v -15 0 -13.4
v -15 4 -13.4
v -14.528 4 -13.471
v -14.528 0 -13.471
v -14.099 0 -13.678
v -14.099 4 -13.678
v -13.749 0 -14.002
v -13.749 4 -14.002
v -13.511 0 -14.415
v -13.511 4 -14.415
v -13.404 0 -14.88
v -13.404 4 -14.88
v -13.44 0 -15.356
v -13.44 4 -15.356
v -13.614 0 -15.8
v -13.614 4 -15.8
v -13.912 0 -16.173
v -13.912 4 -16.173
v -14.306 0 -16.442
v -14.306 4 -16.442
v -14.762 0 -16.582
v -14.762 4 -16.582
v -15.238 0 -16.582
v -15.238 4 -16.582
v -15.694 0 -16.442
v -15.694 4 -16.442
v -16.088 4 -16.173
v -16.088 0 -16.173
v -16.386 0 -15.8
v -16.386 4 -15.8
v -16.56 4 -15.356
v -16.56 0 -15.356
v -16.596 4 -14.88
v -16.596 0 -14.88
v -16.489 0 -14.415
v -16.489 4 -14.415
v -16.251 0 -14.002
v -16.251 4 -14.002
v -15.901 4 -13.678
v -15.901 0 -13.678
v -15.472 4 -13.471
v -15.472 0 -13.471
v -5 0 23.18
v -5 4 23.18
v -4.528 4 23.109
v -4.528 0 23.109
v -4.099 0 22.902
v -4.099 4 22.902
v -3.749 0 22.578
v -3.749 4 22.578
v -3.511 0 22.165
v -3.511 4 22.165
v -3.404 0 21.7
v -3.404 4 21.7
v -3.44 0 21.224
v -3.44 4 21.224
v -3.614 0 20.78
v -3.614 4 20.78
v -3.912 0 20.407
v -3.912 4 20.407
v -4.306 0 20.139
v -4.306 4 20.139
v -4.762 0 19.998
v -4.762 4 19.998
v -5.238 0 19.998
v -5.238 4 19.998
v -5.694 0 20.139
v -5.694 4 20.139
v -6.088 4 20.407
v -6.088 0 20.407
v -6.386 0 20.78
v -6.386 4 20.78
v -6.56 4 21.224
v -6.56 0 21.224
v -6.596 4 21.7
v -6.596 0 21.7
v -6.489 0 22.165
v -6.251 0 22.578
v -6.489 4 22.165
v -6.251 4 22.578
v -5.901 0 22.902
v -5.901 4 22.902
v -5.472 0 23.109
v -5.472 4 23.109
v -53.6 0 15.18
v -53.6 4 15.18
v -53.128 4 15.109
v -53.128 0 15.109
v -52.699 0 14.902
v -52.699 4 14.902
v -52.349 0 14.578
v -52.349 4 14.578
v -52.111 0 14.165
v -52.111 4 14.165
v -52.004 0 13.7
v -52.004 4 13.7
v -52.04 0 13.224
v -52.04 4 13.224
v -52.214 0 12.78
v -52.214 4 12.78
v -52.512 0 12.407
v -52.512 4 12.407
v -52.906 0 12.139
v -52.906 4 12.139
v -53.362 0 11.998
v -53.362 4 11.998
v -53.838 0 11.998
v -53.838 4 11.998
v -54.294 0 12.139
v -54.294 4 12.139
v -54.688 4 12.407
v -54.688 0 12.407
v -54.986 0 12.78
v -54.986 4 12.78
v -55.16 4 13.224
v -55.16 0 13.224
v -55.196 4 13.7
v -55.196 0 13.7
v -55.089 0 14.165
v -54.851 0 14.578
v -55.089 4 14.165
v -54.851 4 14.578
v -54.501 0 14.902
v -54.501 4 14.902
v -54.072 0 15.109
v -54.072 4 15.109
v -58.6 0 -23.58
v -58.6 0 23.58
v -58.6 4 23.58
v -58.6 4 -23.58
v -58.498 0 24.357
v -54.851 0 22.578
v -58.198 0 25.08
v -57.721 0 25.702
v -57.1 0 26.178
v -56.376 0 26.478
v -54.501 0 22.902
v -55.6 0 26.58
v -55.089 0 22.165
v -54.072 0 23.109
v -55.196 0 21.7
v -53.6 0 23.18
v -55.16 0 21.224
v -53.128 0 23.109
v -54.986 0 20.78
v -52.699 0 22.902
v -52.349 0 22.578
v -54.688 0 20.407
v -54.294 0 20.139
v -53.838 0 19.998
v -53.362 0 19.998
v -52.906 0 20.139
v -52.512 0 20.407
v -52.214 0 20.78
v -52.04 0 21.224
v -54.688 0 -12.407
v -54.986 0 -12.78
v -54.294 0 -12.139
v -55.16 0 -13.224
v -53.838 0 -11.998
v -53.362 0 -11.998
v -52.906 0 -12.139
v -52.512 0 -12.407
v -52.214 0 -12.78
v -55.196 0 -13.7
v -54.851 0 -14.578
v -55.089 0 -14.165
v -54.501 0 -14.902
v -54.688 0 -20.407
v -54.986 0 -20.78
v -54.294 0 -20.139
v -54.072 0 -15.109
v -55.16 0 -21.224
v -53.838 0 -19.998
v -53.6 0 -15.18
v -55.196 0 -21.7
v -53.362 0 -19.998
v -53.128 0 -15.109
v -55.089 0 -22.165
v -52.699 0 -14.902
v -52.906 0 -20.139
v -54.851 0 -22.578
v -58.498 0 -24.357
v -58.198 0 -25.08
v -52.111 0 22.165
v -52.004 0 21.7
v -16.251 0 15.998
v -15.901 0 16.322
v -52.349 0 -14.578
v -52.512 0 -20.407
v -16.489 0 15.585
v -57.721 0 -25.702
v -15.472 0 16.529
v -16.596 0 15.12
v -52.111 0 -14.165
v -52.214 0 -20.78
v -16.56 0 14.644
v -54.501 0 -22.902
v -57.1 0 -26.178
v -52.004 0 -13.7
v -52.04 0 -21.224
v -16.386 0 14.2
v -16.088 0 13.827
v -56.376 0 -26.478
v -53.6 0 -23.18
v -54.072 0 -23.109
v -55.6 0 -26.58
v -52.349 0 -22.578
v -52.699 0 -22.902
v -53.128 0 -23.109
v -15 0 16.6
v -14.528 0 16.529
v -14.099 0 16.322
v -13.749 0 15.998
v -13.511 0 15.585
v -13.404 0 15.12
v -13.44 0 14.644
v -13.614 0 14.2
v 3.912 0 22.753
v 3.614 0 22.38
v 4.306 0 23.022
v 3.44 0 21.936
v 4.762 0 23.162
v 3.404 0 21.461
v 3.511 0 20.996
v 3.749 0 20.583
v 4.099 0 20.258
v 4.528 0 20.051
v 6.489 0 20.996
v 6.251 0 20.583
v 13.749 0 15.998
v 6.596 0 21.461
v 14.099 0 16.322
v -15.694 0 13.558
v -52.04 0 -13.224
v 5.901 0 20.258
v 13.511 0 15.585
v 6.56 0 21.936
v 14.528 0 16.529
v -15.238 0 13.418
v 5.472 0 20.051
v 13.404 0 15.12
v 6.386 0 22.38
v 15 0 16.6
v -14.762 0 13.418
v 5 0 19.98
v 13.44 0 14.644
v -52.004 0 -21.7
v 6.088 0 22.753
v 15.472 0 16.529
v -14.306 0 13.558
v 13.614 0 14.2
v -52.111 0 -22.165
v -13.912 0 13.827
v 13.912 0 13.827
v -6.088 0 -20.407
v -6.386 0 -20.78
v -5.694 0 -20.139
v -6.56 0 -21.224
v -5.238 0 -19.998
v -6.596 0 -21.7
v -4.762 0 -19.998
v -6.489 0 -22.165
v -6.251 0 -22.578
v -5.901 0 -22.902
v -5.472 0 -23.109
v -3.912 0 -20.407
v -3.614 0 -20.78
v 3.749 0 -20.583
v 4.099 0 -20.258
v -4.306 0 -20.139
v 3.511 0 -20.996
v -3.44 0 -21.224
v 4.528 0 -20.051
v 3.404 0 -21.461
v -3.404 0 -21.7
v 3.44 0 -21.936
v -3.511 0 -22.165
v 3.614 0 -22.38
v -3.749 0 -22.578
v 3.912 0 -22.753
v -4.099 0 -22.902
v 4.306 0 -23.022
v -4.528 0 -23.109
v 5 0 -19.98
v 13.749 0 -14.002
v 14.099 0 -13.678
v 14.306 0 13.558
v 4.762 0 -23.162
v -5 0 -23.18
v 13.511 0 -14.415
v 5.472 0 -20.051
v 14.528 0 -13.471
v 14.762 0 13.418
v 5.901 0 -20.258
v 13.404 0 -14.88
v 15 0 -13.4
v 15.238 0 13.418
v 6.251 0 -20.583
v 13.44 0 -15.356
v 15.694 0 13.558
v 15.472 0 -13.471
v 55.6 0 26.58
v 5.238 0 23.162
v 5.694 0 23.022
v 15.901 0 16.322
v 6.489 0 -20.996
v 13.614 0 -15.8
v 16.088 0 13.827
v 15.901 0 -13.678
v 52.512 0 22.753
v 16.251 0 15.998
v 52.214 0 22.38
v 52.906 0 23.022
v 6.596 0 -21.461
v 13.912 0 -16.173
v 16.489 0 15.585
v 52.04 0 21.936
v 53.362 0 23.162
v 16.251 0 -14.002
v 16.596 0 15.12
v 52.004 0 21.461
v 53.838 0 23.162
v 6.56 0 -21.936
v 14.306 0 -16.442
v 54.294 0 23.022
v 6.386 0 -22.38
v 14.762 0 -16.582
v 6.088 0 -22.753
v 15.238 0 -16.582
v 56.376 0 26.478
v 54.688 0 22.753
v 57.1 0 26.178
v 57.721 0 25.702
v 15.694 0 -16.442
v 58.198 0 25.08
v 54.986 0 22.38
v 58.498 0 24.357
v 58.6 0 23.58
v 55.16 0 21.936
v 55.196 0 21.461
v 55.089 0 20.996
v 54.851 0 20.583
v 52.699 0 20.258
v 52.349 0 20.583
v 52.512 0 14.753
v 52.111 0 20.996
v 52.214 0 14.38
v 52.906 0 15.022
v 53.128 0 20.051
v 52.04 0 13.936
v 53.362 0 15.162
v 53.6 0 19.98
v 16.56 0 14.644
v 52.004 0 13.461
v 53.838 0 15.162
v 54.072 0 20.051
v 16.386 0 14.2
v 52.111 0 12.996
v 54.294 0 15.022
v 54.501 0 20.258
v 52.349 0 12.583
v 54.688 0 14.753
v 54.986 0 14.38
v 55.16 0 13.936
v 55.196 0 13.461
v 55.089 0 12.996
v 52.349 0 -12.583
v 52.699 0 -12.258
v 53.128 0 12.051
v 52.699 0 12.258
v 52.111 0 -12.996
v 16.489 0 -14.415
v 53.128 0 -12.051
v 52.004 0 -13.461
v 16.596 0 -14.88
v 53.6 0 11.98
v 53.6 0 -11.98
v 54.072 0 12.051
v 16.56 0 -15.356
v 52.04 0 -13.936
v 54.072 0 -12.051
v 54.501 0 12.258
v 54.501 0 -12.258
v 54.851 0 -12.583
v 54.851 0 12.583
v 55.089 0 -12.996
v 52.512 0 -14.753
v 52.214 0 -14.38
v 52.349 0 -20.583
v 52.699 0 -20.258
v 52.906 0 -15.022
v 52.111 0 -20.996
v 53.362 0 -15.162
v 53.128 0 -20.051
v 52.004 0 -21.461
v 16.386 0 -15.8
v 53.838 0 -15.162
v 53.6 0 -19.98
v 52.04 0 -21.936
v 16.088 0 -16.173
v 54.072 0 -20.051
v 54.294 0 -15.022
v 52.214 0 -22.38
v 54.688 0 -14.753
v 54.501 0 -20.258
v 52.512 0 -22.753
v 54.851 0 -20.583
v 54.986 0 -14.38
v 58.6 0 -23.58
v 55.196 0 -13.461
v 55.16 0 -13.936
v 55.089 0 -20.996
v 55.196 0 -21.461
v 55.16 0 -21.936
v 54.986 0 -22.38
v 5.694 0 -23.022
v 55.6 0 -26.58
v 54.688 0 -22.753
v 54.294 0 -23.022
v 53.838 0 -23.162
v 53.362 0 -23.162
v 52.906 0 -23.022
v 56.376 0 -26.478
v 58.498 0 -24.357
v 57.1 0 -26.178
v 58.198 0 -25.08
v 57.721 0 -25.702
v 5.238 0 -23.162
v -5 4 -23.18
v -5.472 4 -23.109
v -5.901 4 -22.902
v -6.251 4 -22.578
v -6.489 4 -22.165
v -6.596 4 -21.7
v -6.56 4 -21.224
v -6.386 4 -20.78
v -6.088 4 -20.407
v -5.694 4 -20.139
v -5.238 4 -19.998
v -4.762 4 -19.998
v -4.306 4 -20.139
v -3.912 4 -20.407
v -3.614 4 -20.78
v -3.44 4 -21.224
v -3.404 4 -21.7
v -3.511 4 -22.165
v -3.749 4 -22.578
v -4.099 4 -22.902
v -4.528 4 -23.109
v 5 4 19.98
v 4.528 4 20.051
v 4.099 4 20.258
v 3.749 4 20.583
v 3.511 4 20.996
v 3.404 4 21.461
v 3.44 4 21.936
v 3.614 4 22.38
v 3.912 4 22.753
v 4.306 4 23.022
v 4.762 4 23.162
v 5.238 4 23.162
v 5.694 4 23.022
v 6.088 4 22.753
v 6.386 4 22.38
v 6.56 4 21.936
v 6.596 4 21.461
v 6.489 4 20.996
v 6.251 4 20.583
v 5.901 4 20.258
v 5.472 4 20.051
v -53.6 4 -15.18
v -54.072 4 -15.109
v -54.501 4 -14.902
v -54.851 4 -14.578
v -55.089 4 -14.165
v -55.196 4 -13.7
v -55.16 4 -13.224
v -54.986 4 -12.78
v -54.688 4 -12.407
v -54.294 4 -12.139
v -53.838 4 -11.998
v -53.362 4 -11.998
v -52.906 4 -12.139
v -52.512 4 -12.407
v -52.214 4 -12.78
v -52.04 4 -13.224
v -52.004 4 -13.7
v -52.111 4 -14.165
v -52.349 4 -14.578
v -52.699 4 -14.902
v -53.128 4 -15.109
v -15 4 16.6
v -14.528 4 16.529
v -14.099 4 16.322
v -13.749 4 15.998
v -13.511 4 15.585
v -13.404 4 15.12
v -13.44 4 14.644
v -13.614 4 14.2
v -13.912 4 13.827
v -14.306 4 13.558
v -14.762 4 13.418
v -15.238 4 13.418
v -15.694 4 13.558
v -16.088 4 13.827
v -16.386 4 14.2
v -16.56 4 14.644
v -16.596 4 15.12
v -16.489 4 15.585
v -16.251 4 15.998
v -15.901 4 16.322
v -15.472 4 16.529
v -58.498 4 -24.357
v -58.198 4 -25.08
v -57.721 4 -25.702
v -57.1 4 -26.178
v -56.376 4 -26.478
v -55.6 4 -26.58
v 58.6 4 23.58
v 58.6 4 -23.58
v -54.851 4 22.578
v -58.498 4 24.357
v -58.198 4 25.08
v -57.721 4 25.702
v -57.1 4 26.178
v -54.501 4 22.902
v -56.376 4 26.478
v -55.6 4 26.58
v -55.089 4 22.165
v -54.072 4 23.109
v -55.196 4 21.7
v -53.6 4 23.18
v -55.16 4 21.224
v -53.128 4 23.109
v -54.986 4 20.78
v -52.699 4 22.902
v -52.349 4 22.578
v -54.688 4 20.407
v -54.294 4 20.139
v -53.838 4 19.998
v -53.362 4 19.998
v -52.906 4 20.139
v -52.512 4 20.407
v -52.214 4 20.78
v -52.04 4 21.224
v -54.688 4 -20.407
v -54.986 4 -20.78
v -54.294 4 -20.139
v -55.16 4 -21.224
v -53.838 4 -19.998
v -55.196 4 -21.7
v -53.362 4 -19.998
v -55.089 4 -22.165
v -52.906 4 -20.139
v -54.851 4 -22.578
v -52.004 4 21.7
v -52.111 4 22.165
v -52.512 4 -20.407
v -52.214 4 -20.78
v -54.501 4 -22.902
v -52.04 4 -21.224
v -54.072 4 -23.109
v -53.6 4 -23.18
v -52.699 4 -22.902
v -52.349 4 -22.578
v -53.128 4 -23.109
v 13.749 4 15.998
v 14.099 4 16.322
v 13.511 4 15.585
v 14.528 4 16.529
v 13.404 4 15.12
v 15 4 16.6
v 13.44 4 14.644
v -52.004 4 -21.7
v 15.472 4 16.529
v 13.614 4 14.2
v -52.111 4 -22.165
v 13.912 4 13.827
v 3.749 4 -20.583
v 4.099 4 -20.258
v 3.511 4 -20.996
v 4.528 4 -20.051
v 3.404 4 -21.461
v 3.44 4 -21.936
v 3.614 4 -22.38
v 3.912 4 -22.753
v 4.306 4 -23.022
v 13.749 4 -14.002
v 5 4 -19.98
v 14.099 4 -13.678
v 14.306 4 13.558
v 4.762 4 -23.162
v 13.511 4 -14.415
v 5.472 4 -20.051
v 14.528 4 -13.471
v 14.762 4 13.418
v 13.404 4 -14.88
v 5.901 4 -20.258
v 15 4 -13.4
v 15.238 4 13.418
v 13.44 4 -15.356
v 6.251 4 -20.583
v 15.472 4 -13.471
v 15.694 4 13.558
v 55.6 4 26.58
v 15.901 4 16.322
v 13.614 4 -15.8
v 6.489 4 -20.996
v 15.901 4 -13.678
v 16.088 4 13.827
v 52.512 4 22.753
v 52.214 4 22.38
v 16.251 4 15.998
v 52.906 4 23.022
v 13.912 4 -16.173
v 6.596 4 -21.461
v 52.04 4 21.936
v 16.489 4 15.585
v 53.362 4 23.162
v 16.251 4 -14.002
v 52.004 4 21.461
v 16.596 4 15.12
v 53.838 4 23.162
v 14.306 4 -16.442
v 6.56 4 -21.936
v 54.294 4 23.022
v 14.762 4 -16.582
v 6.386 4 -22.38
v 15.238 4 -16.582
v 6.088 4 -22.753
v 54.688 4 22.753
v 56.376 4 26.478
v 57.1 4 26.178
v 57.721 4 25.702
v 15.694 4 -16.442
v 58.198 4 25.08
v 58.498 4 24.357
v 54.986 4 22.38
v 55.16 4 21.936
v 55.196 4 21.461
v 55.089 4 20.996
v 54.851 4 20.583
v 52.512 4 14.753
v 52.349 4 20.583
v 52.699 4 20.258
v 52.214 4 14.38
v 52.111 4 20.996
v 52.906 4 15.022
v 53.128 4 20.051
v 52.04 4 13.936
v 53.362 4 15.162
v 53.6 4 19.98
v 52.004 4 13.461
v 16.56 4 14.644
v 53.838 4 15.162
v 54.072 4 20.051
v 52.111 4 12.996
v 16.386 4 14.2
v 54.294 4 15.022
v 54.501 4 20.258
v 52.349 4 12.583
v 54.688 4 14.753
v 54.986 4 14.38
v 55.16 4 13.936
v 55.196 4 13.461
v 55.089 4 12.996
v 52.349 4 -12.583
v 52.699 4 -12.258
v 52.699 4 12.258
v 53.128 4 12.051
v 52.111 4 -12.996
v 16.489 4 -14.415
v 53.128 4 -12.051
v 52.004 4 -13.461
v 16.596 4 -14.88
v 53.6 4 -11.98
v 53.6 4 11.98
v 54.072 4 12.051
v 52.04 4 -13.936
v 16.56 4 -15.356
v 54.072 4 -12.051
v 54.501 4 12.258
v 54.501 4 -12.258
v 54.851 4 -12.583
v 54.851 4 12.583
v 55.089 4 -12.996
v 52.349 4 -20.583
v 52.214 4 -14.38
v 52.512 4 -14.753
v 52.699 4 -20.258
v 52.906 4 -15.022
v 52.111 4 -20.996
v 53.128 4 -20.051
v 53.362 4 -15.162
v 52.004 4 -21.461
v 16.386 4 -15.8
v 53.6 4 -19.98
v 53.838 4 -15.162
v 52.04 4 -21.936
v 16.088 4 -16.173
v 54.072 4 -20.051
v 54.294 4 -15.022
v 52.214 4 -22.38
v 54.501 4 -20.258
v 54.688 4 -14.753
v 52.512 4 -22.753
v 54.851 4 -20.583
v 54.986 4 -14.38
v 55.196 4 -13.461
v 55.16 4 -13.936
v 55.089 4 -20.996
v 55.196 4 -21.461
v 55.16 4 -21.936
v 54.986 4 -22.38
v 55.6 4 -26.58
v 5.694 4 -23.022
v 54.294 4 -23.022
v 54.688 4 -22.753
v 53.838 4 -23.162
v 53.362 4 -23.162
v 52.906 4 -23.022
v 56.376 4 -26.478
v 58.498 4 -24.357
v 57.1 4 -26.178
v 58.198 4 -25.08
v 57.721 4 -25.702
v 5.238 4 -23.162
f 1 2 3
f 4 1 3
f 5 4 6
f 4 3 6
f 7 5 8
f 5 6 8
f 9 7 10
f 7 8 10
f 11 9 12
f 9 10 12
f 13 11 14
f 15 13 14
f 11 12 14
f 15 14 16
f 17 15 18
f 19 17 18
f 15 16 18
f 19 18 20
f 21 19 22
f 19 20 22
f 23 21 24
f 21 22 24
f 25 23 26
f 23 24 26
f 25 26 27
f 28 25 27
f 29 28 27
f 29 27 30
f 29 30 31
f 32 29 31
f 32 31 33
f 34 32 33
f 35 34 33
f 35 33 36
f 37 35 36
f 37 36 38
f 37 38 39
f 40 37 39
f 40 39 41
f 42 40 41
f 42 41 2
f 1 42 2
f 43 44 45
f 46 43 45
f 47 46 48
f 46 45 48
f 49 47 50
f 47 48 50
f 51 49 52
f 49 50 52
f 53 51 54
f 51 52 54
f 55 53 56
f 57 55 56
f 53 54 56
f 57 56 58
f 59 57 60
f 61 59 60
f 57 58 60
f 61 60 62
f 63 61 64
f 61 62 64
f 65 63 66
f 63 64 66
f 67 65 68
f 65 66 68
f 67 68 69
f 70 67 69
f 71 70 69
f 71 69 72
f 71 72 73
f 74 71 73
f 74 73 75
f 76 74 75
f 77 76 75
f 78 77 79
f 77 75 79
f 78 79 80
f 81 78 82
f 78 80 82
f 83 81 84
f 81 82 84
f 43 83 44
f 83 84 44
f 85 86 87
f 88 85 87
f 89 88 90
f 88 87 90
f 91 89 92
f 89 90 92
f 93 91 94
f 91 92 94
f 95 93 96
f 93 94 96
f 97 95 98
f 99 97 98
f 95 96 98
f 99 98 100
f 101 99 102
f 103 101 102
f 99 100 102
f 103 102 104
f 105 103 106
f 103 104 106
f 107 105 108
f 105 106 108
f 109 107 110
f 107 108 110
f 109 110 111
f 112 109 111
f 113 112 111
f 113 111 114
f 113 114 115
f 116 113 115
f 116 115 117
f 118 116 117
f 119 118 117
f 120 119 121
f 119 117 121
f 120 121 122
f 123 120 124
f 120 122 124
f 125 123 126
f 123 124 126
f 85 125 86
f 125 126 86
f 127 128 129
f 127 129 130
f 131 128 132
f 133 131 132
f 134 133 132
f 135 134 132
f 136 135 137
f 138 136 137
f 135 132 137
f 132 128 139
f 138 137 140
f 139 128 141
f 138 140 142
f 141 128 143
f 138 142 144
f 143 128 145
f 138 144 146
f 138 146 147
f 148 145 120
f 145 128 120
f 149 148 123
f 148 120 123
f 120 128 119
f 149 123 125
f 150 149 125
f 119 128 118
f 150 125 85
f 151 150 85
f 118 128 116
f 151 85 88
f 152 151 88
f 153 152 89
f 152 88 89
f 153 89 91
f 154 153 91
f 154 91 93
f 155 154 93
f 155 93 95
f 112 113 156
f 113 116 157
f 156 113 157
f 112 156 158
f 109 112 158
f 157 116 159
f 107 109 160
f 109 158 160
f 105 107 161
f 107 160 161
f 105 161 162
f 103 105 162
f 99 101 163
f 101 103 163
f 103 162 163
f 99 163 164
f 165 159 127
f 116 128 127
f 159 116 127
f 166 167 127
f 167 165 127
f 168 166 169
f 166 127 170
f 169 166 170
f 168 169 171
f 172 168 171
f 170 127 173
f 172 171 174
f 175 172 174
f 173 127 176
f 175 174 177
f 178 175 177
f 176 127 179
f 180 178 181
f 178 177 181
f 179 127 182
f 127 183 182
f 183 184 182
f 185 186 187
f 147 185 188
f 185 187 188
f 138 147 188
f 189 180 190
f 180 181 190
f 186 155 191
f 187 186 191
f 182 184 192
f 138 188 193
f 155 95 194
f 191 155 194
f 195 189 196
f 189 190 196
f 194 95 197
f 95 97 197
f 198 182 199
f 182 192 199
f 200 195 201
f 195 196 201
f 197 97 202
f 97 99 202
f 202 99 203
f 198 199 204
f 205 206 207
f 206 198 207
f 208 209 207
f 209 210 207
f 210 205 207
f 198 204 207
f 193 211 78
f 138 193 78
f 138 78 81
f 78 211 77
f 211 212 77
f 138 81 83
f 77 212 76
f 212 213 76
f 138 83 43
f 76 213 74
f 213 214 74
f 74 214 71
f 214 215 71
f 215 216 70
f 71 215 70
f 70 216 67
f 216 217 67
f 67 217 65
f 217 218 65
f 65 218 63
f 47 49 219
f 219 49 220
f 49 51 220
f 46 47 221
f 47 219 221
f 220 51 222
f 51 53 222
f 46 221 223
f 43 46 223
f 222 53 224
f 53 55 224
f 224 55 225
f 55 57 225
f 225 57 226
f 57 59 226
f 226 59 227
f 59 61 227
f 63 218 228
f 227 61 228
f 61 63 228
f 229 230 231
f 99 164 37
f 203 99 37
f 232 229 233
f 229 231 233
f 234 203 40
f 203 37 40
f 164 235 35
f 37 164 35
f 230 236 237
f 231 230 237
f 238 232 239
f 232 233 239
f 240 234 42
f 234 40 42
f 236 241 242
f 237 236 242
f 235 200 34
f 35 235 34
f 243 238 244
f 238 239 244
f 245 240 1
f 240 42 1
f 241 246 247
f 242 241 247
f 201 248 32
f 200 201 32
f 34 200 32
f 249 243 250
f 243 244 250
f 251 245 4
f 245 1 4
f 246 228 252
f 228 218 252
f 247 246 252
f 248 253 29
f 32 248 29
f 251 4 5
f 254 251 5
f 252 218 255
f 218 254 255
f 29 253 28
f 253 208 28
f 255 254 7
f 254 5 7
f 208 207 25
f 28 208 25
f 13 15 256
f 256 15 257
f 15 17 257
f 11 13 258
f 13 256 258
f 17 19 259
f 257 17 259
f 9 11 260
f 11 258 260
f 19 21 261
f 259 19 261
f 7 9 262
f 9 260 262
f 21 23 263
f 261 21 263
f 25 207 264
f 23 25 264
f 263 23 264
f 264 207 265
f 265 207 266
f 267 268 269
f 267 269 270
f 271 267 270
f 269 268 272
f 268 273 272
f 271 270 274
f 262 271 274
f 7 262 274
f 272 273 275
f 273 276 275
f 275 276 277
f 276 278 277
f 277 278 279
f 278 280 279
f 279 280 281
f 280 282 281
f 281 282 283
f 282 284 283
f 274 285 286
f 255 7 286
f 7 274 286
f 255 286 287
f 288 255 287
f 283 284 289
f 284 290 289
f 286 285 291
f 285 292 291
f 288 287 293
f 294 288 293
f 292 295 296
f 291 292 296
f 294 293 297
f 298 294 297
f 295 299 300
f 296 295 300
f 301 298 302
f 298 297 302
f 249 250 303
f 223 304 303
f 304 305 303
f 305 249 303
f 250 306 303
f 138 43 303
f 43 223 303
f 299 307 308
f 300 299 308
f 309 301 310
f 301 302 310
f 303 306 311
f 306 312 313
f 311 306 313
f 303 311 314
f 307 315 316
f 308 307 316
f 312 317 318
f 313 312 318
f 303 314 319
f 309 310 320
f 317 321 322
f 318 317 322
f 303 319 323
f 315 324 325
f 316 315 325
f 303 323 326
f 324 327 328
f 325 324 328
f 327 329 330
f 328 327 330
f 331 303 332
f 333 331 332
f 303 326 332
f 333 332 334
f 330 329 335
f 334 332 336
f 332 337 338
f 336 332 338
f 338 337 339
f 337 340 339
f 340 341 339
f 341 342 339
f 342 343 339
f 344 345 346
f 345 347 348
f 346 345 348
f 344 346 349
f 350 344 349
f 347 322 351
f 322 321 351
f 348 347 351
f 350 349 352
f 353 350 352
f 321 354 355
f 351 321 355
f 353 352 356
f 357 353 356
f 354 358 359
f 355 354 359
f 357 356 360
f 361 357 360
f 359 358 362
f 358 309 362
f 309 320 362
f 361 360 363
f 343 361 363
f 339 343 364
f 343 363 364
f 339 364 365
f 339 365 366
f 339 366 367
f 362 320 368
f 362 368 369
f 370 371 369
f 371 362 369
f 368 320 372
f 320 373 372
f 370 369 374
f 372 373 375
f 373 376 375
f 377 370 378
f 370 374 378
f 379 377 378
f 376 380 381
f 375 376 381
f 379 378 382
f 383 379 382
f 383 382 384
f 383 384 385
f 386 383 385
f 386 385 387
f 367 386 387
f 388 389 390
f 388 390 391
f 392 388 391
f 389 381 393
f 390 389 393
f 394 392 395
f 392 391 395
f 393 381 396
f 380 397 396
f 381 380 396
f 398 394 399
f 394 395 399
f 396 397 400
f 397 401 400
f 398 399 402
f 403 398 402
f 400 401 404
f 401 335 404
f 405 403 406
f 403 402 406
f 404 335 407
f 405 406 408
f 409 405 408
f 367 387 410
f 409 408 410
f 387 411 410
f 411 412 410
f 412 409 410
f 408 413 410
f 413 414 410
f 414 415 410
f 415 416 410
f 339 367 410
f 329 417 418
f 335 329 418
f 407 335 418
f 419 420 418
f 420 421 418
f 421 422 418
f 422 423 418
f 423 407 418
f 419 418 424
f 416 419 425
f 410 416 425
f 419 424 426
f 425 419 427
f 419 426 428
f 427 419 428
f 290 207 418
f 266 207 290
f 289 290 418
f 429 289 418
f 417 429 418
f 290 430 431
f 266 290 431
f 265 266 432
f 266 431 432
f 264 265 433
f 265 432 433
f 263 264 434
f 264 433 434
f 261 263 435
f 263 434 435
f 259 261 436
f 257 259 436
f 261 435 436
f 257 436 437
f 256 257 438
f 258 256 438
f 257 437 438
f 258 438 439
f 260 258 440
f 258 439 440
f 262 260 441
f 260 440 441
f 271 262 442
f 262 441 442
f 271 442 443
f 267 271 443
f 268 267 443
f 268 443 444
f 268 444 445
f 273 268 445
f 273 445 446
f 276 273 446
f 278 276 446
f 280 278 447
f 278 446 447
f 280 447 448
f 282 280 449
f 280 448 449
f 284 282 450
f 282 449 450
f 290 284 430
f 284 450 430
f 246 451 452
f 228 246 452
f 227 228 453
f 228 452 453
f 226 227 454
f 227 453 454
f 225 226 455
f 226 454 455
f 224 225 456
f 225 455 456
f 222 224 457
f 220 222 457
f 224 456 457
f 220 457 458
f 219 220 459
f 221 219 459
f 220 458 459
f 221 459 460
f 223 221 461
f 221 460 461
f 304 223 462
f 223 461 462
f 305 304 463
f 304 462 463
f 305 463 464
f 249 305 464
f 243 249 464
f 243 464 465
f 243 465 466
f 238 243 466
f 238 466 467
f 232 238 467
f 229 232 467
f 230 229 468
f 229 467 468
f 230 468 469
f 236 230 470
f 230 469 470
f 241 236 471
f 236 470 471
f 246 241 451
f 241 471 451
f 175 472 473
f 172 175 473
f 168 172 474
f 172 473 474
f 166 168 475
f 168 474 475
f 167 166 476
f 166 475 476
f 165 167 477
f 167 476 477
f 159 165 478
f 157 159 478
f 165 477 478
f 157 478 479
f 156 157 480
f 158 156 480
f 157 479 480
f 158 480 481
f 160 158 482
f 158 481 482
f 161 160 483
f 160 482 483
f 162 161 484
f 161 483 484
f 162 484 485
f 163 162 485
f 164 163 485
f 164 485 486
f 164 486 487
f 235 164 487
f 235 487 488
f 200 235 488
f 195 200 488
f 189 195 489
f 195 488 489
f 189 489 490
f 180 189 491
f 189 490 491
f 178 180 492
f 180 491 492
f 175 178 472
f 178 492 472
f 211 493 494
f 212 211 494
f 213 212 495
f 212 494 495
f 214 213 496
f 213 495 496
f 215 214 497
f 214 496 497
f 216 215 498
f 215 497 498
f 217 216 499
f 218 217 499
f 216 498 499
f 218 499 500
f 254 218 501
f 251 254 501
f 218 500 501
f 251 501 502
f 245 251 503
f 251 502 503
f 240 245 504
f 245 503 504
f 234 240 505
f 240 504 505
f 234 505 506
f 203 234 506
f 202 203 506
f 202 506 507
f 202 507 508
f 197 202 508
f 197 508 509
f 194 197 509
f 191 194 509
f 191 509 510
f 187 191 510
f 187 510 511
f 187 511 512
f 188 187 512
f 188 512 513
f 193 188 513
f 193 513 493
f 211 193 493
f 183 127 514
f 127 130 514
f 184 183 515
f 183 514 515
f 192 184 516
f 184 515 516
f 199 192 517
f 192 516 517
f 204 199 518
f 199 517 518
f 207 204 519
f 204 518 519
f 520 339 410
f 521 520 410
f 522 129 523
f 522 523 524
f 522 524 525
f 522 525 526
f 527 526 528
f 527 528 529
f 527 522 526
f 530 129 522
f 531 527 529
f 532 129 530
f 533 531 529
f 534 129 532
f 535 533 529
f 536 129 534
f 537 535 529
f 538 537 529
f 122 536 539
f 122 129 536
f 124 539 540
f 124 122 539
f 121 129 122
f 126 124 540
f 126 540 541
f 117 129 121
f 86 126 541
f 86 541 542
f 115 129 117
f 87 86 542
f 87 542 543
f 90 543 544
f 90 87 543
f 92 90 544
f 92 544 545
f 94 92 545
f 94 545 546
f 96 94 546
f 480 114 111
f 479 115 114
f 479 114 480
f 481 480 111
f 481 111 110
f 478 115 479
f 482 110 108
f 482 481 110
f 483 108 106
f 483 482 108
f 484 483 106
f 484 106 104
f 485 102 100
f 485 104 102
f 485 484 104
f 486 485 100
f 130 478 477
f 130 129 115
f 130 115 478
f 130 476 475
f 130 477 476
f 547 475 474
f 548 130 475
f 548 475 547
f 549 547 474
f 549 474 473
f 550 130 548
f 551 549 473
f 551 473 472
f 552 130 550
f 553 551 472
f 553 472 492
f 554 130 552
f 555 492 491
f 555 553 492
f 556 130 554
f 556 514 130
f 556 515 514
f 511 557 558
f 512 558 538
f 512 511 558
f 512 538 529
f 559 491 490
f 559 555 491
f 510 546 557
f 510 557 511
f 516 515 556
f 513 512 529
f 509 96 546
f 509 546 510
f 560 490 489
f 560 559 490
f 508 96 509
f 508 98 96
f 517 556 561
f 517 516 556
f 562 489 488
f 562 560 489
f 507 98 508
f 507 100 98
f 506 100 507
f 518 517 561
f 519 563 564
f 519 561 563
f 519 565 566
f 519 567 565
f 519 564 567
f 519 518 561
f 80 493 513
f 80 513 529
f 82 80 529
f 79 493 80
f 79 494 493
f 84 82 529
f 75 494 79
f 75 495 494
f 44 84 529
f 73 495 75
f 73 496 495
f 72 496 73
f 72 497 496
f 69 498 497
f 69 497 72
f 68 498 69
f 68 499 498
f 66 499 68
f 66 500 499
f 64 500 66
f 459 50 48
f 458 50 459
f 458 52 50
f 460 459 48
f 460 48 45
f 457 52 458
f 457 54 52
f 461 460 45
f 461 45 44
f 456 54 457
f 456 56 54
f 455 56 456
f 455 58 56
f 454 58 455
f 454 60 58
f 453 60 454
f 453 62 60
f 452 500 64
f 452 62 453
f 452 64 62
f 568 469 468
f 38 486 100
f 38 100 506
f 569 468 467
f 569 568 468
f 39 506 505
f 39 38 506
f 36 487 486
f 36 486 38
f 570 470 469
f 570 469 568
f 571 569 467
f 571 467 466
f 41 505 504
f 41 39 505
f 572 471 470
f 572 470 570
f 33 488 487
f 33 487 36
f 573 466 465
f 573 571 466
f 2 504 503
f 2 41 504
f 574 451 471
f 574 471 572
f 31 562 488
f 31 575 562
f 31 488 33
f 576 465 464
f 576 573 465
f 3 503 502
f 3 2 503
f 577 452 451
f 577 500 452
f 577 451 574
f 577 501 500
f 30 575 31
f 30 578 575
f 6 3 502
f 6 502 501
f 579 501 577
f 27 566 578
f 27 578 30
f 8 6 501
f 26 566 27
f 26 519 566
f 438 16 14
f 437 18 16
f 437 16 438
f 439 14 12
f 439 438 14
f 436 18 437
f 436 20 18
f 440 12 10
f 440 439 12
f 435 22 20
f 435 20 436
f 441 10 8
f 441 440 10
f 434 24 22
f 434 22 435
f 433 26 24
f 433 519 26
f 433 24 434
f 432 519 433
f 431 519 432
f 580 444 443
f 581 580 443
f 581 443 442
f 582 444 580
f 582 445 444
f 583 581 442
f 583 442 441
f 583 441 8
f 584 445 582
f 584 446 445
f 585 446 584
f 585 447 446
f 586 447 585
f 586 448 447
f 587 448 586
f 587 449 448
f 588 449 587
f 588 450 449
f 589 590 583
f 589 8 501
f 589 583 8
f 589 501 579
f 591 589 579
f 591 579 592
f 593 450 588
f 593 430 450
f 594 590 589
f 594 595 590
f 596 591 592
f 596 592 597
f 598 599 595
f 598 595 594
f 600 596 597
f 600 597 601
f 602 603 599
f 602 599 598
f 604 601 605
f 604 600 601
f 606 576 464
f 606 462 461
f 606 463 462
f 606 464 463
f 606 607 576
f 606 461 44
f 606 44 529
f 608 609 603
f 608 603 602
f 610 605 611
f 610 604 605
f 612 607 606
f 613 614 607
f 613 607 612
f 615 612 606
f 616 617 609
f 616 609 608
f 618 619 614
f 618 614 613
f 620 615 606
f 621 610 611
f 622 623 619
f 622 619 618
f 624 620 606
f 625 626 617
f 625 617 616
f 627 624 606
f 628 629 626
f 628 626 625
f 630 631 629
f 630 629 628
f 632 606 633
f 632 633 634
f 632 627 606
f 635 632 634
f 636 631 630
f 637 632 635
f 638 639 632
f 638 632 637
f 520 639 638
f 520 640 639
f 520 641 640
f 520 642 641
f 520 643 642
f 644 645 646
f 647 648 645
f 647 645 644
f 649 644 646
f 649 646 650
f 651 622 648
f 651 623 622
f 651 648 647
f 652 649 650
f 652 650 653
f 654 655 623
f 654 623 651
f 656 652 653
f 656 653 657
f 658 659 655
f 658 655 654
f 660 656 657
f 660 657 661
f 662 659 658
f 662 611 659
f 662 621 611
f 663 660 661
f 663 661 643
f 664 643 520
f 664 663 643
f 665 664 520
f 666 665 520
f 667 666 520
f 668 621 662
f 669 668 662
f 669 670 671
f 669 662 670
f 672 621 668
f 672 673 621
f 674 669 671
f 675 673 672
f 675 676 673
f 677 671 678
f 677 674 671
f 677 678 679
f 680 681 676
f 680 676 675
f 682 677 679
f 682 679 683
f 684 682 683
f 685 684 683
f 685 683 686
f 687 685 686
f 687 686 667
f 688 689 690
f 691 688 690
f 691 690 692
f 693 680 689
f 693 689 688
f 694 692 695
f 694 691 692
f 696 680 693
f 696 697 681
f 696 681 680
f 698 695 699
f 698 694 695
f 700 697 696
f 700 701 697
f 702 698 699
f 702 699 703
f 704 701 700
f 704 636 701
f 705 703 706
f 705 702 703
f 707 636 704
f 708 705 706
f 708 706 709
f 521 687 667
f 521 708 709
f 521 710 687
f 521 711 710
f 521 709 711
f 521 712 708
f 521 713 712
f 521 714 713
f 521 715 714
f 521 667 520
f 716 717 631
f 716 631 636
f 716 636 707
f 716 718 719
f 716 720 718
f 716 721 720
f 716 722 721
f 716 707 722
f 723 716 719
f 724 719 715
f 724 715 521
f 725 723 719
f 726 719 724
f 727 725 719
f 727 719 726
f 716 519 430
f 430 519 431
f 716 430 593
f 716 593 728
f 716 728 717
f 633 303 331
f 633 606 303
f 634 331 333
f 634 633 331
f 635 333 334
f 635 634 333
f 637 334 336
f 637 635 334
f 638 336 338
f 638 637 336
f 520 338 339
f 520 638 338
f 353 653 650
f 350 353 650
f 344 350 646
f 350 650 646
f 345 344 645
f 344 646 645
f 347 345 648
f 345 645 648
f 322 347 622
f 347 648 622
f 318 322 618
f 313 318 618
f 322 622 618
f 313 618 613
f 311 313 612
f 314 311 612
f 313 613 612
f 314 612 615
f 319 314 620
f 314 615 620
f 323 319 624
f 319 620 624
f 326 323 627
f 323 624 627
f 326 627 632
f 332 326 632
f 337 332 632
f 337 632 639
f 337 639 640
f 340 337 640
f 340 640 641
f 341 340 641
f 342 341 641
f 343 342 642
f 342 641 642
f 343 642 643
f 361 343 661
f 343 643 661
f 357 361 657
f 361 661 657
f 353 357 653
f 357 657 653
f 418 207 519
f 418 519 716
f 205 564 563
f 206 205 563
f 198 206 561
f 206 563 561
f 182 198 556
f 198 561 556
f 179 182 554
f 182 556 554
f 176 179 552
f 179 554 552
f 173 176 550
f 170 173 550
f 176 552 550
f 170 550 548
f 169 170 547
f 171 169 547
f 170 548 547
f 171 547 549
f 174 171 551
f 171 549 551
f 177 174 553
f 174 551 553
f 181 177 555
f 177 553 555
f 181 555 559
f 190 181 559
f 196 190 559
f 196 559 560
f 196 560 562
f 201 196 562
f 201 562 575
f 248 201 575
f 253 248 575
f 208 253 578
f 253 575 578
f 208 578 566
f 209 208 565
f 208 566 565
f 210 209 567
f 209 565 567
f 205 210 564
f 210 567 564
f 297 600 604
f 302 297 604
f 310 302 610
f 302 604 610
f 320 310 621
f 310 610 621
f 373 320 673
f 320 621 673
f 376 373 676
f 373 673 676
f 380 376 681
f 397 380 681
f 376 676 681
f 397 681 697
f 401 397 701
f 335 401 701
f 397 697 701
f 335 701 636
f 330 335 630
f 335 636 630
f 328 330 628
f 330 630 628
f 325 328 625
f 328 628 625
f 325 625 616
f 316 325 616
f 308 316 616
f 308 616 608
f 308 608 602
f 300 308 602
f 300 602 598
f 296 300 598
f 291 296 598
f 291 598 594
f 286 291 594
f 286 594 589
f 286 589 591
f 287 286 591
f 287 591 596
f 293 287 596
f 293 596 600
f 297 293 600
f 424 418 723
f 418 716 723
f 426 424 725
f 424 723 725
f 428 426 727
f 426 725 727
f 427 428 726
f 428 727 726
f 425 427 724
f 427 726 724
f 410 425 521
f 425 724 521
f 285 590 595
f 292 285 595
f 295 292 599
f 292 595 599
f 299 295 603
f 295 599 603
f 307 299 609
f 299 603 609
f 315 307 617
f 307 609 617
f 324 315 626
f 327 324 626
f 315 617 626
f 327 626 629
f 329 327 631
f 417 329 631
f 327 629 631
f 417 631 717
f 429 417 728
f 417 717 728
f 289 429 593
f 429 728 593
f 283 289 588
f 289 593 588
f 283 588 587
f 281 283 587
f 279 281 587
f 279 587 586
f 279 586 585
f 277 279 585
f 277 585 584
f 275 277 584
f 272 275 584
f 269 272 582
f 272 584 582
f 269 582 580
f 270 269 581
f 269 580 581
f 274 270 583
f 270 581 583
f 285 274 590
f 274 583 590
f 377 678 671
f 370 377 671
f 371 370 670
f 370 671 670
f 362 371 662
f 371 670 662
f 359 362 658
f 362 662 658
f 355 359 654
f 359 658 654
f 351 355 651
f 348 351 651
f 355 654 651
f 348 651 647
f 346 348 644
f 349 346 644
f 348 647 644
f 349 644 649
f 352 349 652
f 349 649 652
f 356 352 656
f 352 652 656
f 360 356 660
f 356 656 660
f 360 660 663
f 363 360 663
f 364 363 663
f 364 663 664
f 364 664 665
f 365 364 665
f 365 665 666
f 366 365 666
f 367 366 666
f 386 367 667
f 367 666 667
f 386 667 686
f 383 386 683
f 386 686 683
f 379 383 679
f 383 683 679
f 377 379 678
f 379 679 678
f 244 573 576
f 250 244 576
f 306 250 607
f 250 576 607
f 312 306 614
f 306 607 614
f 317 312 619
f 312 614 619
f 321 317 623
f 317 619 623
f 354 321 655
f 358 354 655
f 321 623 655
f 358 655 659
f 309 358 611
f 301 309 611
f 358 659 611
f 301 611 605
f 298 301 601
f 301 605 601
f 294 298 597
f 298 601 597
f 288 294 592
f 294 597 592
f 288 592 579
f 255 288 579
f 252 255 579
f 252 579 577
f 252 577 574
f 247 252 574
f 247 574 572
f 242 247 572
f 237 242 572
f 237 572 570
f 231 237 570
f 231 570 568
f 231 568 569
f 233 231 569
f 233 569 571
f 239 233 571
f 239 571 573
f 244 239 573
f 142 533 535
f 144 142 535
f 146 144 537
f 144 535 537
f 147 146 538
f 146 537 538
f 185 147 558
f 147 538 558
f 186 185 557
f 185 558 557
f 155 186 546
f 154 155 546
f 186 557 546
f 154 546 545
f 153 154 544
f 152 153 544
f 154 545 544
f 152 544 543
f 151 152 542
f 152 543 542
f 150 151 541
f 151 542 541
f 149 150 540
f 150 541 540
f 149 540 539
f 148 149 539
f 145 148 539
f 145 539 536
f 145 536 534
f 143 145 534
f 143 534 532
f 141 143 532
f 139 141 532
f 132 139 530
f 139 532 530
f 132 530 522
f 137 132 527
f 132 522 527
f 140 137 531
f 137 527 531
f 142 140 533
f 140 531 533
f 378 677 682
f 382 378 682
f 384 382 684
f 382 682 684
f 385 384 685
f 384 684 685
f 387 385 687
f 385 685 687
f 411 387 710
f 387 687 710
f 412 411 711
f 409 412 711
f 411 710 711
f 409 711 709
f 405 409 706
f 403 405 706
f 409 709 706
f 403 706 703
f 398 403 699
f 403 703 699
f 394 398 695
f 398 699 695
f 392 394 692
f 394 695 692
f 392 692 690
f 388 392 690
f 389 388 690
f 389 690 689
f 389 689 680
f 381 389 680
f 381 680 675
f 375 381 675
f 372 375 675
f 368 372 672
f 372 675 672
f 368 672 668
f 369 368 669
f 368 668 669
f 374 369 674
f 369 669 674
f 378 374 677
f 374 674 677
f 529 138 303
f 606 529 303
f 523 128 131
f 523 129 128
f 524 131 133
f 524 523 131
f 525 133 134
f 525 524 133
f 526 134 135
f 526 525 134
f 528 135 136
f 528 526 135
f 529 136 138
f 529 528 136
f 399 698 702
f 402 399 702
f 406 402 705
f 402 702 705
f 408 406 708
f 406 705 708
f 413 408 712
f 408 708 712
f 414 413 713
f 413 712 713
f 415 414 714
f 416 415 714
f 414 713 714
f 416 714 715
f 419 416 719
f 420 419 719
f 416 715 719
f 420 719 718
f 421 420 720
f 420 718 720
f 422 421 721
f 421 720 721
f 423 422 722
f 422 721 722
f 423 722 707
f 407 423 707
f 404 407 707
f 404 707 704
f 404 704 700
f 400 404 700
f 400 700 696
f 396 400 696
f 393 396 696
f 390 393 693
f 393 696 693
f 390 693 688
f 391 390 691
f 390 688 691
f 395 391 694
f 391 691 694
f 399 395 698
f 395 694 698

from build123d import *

# Parameters (mm, degrees)
SKETCH_1_W          = 117.2
SKETCH_1_H          = 53.16059175
EXTRUDE_1_DEPTH     = 4
SKETCH_3_R          = 1.6
CUT_EXTRUDE_1_DEPTH = 4
FILLET_1_R          = 3
SKETCH_4_R          = 1.6
CUT_EXTRUDE_2_DEPTH = 10


with BuildPart() as part:
    # 草图1 → 凸台-拉伸1 (new body)
    with BuildSketch(Plane(origin=(0, 0, 0), x_dir=(1, 0, 0), z_dir=(0, 1, 0))):
        Rectangle(SKETCH_1_W, SKETCH_1_H)
    extrude(amount=EXTRUDE_1_DEPTH)

    # 草图3 → 切除-拉伸1 (cut)
    with BuildSketch(Plane(origin=(0, 4, 0), x_dir=(1, 0, 0), z_dir=(0, 1, 0))):
        with Locations(Location((-53.6, -21.580295875, 0), (0, 0, 270))):
            Circle(SKETCH_3_R)
        with Locations(Location((-53.6, -13.580295875, 0), (0, 0, 270))):
            Circle(SKETCH_3_R)
        with Locations(Location((-5, -21.580295875, 0), (0, 0, 270))):
            Circle(SKETCH_3_R)
        with Locations(Location((5, -21.580295875, 0), (0, 0, 90))):
            Circle(SKETCH_3_R)
        with Locations(Location((53.6, -13.580295875, 0), (0, 0, 90))):
            Circle(SKETCH_3_R)
        with Locations(Location((53.6, -21.580295875, 0), (0, 0, 90))):
            Circle(SKETCH_3_R)
        with Locations(Location((-53.6, 13.580295875, 0), (0, 0, 90))):
            Circle(SKETCH_3_R)
        with Locations(Location((-53.6, 21.580295875, 0), (0, 0, 90))):
            Circle(SKETCH_3_R)
        with Locations(Location((-5, 21.580295875, 0), (0, 0, 90))):
            Circle(SKETCH_3_R)
        with Locations(Location((5, 21.580295875, 0), (0, 0, 270))):
            Circle(SKETCH_3_R)
        with Locations(Location((53.6, 21.580295875, 0), (0, 0, 270))):
            Circle(SKETCH_3_R)
        with Locations(Location((53.6, 13.580295875, 0), (0, 0, 270))):
            Circle(SKETCH_3_R)
    extrude(amount=-CUT_EXTRUDE_1_DEPTH, mode=Mode.SUBTRACT)

    # 圆角1
    fillet_1_edges = [part.edges().sort_by_distance(p)[0] for p in [
        (58.6, 2, 26.580295875),
        (-58.6, 2, 26.580295875),
        (-58.6, 2, -26.580295875),
        (58.6, 2, -26.580295875),
    ]]
    fillet(fillet_1_edges, radius=FILLET_1_R)

    # 草图4 → 切除-拉伸2 (cut)
    with BuildSketch(Plane(origin=(0, 4, 0), x_dir=(1, 0, 0), z_dir=(0, 1, 0))):
        with Locations(Location((-15, -15, 0), (0, 0, 270))):
            Circle(SKETCH_4_R)
        with Locations(Location((15, 15, 0), (0, 0, 270))):
            Circle(SKETCH_4_R)
        with Locations(Location((15, -15, 0), (0, 0, 270))):
            Circle(SKETCH_4_R)
        with Locations(Location((-15, 15, 0), (0, 0, 270))):
            Circle(SKETCH_4_R)
    extrude(amount=-CUT_EXTRUDE_2_DEPTH, mode=Mode.SUBTRACT)


solid = part.part
